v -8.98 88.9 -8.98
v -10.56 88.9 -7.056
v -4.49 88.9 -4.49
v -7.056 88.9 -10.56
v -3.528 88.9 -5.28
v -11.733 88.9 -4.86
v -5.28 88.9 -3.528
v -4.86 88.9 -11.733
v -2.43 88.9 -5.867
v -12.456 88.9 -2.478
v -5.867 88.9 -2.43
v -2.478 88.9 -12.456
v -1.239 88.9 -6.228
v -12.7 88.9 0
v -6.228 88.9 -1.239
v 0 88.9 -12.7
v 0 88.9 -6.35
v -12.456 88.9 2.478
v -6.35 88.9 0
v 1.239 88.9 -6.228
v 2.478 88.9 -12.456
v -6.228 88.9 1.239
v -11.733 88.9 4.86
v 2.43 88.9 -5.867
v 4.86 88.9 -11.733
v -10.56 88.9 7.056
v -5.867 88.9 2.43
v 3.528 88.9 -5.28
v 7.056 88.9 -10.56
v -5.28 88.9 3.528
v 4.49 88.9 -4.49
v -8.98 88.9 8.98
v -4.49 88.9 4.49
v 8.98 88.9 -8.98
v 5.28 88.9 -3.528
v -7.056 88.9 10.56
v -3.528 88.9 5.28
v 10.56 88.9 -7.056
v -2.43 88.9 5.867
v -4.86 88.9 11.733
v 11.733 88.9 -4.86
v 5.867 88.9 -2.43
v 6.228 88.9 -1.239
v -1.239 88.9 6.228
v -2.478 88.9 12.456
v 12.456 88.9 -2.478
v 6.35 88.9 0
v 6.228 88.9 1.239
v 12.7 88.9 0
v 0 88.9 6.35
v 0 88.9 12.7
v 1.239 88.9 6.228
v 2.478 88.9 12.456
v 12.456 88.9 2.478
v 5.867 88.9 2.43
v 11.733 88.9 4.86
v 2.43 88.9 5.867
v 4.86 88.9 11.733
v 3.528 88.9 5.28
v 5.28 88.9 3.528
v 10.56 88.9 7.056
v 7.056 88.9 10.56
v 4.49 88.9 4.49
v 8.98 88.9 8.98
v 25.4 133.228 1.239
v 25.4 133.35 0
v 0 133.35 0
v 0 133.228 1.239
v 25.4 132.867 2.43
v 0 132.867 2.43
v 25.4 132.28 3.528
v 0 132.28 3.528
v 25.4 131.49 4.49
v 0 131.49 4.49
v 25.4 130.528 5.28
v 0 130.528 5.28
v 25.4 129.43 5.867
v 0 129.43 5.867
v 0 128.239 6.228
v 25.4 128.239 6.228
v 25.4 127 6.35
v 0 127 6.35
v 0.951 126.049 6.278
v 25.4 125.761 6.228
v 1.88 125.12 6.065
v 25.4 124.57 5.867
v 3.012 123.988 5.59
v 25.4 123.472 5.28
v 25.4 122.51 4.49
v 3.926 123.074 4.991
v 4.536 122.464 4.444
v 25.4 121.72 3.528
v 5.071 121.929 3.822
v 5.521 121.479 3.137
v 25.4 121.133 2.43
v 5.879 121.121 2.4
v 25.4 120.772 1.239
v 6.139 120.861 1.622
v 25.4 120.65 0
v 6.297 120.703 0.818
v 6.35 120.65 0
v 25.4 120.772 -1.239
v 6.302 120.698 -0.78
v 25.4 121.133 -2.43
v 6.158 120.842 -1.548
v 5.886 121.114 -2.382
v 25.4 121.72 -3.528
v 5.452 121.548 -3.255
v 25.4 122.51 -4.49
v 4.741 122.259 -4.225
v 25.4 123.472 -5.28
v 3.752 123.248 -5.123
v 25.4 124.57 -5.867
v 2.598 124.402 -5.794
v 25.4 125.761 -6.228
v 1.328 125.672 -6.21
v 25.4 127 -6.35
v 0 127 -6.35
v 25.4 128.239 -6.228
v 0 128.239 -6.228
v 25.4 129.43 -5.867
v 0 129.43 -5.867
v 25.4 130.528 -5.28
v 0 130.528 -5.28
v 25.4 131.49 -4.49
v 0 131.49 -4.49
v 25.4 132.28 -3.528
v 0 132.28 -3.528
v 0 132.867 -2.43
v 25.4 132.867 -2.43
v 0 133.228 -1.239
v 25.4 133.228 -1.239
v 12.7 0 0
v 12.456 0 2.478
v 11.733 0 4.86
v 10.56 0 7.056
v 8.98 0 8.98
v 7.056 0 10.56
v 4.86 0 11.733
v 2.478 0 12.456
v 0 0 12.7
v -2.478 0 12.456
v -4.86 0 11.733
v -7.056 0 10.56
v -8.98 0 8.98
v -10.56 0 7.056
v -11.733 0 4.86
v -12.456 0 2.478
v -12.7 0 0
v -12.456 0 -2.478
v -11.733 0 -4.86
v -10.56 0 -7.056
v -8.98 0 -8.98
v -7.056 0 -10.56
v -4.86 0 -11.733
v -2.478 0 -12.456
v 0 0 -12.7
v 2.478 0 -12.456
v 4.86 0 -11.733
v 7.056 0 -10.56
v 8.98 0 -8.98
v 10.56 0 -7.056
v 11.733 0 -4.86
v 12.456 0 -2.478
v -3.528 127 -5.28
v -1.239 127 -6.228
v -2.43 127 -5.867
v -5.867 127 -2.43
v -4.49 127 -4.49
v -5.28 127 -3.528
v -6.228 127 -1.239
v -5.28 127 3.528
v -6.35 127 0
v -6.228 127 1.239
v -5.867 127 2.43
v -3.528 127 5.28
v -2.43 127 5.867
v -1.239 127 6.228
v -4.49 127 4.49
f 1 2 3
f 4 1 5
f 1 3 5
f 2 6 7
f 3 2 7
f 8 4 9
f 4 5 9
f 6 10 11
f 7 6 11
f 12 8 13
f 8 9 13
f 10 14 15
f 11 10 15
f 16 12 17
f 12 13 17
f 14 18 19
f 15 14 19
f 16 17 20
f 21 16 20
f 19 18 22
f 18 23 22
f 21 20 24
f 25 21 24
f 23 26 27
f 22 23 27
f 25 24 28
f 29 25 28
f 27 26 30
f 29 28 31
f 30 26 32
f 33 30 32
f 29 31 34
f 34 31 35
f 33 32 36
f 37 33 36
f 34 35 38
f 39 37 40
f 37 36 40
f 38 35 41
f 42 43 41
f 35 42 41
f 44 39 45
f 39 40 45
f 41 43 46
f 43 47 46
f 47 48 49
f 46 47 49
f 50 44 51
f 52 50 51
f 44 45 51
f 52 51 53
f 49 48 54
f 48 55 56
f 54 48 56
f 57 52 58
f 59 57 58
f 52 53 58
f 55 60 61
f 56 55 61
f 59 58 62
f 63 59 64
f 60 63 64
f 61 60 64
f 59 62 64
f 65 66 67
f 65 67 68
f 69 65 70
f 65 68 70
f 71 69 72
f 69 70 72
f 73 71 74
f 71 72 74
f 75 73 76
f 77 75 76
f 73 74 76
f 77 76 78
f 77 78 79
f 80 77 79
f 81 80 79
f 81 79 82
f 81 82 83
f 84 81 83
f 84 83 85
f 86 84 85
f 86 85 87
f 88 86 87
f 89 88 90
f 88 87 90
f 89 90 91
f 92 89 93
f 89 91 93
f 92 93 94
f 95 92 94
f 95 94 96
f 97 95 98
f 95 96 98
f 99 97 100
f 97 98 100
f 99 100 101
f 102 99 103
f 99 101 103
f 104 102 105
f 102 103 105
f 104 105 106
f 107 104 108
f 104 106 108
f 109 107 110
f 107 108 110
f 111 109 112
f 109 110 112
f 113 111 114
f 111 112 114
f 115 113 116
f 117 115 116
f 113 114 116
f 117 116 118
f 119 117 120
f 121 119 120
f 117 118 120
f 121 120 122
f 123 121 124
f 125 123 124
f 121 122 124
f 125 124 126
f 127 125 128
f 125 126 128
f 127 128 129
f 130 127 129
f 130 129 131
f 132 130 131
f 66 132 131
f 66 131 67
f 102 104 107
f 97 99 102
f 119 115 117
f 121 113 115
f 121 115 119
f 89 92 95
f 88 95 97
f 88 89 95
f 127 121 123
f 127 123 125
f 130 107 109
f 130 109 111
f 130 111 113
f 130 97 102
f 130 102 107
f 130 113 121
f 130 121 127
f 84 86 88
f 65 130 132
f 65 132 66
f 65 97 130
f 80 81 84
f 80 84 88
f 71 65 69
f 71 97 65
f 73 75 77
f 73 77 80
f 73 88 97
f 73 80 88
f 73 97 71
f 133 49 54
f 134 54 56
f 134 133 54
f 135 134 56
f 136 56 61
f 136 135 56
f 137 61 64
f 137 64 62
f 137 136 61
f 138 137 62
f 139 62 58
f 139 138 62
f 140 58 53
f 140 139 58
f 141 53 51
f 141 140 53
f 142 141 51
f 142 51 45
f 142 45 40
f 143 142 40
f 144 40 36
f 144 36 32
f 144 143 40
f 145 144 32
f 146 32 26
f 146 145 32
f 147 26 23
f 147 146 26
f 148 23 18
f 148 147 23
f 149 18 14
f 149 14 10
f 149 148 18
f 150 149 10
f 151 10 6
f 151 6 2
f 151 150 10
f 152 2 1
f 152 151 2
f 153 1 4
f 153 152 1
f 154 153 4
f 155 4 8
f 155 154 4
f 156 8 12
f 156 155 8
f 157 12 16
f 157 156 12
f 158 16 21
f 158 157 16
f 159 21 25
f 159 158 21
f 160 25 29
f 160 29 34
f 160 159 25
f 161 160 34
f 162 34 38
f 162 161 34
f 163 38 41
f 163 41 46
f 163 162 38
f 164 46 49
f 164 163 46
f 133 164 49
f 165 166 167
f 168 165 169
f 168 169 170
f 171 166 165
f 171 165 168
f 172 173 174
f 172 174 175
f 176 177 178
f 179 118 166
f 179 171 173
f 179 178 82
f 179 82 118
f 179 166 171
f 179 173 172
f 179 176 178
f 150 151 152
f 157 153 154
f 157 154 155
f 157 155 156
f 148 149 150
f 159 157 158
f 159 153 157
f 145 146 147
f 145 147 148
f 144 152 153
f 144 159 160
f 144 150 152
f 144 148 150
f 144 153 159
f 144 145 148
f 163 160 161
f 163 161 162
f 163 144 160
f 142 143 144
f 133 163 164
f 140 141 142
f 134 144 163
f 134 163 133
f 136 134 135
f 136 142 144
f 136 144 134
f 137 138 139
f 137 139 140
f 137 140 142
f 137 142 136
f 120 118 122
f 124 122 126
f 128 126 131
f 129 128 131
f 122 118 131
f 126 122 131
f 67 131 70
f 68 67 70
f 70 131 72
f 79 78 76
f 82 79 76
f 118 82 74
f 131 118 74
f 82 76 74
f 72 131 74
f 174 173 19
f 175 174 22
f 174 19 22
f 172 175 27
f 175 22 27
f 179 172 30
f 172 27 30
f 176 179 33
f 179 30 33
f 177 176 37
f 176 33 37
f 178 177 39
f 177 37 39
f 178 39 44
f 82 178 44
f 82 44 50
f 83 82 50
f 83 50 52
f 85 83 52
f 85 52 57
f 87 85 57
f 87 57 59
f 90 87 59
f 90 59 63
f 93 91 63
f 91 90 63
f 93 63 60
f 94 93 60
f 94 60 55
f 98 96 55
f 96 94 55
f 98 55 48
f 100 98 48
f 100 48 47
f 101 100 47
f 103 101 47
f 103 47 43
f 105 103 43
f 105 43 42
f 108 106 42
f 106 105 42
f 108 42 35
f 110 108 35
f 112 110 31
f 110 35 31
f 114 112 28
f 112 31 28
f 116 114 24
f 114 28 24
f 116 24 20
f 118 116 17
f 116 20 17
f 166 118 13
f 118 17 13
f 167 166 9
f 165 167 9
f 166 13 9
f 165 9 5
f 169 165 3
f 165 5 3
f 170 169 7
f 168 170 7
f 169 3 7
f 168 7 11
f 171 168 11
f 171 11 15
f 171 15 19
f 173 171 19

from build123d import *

# Parameters (mm, degrees)
F0_R     = 12.7
F1_DEPTH = 88.9
F2_R     = 6.35
F3_DEPTH = 38.1
F4_R     = 6.35
F5_DEPTH = 25.4


with BuildPart() as f1:
    # F0 (on Front) → F1 (new body)
    with BuildSketch(Plane.XZ):
        Circle(F0_R)
    extrude(amount=-F1_DEPTH)

    # F2 (on face) → F3 (join)
    with BuildSketch(Plane(origin=(0, 88.9, 0), x_dir=(-1, 0, 0), z_dir=(0, 1, 0))):
        Circle(F2_R)
    extrude(amount=F3_DEPTH)

    # F4 (on Right) → F5 (join)
    with BuildSketch(Plane.YZ):
        with Locations((127, 0)):
            Circle(F4_R)
    extrude(amount=F5_DEPTH)


solid = f1.part
